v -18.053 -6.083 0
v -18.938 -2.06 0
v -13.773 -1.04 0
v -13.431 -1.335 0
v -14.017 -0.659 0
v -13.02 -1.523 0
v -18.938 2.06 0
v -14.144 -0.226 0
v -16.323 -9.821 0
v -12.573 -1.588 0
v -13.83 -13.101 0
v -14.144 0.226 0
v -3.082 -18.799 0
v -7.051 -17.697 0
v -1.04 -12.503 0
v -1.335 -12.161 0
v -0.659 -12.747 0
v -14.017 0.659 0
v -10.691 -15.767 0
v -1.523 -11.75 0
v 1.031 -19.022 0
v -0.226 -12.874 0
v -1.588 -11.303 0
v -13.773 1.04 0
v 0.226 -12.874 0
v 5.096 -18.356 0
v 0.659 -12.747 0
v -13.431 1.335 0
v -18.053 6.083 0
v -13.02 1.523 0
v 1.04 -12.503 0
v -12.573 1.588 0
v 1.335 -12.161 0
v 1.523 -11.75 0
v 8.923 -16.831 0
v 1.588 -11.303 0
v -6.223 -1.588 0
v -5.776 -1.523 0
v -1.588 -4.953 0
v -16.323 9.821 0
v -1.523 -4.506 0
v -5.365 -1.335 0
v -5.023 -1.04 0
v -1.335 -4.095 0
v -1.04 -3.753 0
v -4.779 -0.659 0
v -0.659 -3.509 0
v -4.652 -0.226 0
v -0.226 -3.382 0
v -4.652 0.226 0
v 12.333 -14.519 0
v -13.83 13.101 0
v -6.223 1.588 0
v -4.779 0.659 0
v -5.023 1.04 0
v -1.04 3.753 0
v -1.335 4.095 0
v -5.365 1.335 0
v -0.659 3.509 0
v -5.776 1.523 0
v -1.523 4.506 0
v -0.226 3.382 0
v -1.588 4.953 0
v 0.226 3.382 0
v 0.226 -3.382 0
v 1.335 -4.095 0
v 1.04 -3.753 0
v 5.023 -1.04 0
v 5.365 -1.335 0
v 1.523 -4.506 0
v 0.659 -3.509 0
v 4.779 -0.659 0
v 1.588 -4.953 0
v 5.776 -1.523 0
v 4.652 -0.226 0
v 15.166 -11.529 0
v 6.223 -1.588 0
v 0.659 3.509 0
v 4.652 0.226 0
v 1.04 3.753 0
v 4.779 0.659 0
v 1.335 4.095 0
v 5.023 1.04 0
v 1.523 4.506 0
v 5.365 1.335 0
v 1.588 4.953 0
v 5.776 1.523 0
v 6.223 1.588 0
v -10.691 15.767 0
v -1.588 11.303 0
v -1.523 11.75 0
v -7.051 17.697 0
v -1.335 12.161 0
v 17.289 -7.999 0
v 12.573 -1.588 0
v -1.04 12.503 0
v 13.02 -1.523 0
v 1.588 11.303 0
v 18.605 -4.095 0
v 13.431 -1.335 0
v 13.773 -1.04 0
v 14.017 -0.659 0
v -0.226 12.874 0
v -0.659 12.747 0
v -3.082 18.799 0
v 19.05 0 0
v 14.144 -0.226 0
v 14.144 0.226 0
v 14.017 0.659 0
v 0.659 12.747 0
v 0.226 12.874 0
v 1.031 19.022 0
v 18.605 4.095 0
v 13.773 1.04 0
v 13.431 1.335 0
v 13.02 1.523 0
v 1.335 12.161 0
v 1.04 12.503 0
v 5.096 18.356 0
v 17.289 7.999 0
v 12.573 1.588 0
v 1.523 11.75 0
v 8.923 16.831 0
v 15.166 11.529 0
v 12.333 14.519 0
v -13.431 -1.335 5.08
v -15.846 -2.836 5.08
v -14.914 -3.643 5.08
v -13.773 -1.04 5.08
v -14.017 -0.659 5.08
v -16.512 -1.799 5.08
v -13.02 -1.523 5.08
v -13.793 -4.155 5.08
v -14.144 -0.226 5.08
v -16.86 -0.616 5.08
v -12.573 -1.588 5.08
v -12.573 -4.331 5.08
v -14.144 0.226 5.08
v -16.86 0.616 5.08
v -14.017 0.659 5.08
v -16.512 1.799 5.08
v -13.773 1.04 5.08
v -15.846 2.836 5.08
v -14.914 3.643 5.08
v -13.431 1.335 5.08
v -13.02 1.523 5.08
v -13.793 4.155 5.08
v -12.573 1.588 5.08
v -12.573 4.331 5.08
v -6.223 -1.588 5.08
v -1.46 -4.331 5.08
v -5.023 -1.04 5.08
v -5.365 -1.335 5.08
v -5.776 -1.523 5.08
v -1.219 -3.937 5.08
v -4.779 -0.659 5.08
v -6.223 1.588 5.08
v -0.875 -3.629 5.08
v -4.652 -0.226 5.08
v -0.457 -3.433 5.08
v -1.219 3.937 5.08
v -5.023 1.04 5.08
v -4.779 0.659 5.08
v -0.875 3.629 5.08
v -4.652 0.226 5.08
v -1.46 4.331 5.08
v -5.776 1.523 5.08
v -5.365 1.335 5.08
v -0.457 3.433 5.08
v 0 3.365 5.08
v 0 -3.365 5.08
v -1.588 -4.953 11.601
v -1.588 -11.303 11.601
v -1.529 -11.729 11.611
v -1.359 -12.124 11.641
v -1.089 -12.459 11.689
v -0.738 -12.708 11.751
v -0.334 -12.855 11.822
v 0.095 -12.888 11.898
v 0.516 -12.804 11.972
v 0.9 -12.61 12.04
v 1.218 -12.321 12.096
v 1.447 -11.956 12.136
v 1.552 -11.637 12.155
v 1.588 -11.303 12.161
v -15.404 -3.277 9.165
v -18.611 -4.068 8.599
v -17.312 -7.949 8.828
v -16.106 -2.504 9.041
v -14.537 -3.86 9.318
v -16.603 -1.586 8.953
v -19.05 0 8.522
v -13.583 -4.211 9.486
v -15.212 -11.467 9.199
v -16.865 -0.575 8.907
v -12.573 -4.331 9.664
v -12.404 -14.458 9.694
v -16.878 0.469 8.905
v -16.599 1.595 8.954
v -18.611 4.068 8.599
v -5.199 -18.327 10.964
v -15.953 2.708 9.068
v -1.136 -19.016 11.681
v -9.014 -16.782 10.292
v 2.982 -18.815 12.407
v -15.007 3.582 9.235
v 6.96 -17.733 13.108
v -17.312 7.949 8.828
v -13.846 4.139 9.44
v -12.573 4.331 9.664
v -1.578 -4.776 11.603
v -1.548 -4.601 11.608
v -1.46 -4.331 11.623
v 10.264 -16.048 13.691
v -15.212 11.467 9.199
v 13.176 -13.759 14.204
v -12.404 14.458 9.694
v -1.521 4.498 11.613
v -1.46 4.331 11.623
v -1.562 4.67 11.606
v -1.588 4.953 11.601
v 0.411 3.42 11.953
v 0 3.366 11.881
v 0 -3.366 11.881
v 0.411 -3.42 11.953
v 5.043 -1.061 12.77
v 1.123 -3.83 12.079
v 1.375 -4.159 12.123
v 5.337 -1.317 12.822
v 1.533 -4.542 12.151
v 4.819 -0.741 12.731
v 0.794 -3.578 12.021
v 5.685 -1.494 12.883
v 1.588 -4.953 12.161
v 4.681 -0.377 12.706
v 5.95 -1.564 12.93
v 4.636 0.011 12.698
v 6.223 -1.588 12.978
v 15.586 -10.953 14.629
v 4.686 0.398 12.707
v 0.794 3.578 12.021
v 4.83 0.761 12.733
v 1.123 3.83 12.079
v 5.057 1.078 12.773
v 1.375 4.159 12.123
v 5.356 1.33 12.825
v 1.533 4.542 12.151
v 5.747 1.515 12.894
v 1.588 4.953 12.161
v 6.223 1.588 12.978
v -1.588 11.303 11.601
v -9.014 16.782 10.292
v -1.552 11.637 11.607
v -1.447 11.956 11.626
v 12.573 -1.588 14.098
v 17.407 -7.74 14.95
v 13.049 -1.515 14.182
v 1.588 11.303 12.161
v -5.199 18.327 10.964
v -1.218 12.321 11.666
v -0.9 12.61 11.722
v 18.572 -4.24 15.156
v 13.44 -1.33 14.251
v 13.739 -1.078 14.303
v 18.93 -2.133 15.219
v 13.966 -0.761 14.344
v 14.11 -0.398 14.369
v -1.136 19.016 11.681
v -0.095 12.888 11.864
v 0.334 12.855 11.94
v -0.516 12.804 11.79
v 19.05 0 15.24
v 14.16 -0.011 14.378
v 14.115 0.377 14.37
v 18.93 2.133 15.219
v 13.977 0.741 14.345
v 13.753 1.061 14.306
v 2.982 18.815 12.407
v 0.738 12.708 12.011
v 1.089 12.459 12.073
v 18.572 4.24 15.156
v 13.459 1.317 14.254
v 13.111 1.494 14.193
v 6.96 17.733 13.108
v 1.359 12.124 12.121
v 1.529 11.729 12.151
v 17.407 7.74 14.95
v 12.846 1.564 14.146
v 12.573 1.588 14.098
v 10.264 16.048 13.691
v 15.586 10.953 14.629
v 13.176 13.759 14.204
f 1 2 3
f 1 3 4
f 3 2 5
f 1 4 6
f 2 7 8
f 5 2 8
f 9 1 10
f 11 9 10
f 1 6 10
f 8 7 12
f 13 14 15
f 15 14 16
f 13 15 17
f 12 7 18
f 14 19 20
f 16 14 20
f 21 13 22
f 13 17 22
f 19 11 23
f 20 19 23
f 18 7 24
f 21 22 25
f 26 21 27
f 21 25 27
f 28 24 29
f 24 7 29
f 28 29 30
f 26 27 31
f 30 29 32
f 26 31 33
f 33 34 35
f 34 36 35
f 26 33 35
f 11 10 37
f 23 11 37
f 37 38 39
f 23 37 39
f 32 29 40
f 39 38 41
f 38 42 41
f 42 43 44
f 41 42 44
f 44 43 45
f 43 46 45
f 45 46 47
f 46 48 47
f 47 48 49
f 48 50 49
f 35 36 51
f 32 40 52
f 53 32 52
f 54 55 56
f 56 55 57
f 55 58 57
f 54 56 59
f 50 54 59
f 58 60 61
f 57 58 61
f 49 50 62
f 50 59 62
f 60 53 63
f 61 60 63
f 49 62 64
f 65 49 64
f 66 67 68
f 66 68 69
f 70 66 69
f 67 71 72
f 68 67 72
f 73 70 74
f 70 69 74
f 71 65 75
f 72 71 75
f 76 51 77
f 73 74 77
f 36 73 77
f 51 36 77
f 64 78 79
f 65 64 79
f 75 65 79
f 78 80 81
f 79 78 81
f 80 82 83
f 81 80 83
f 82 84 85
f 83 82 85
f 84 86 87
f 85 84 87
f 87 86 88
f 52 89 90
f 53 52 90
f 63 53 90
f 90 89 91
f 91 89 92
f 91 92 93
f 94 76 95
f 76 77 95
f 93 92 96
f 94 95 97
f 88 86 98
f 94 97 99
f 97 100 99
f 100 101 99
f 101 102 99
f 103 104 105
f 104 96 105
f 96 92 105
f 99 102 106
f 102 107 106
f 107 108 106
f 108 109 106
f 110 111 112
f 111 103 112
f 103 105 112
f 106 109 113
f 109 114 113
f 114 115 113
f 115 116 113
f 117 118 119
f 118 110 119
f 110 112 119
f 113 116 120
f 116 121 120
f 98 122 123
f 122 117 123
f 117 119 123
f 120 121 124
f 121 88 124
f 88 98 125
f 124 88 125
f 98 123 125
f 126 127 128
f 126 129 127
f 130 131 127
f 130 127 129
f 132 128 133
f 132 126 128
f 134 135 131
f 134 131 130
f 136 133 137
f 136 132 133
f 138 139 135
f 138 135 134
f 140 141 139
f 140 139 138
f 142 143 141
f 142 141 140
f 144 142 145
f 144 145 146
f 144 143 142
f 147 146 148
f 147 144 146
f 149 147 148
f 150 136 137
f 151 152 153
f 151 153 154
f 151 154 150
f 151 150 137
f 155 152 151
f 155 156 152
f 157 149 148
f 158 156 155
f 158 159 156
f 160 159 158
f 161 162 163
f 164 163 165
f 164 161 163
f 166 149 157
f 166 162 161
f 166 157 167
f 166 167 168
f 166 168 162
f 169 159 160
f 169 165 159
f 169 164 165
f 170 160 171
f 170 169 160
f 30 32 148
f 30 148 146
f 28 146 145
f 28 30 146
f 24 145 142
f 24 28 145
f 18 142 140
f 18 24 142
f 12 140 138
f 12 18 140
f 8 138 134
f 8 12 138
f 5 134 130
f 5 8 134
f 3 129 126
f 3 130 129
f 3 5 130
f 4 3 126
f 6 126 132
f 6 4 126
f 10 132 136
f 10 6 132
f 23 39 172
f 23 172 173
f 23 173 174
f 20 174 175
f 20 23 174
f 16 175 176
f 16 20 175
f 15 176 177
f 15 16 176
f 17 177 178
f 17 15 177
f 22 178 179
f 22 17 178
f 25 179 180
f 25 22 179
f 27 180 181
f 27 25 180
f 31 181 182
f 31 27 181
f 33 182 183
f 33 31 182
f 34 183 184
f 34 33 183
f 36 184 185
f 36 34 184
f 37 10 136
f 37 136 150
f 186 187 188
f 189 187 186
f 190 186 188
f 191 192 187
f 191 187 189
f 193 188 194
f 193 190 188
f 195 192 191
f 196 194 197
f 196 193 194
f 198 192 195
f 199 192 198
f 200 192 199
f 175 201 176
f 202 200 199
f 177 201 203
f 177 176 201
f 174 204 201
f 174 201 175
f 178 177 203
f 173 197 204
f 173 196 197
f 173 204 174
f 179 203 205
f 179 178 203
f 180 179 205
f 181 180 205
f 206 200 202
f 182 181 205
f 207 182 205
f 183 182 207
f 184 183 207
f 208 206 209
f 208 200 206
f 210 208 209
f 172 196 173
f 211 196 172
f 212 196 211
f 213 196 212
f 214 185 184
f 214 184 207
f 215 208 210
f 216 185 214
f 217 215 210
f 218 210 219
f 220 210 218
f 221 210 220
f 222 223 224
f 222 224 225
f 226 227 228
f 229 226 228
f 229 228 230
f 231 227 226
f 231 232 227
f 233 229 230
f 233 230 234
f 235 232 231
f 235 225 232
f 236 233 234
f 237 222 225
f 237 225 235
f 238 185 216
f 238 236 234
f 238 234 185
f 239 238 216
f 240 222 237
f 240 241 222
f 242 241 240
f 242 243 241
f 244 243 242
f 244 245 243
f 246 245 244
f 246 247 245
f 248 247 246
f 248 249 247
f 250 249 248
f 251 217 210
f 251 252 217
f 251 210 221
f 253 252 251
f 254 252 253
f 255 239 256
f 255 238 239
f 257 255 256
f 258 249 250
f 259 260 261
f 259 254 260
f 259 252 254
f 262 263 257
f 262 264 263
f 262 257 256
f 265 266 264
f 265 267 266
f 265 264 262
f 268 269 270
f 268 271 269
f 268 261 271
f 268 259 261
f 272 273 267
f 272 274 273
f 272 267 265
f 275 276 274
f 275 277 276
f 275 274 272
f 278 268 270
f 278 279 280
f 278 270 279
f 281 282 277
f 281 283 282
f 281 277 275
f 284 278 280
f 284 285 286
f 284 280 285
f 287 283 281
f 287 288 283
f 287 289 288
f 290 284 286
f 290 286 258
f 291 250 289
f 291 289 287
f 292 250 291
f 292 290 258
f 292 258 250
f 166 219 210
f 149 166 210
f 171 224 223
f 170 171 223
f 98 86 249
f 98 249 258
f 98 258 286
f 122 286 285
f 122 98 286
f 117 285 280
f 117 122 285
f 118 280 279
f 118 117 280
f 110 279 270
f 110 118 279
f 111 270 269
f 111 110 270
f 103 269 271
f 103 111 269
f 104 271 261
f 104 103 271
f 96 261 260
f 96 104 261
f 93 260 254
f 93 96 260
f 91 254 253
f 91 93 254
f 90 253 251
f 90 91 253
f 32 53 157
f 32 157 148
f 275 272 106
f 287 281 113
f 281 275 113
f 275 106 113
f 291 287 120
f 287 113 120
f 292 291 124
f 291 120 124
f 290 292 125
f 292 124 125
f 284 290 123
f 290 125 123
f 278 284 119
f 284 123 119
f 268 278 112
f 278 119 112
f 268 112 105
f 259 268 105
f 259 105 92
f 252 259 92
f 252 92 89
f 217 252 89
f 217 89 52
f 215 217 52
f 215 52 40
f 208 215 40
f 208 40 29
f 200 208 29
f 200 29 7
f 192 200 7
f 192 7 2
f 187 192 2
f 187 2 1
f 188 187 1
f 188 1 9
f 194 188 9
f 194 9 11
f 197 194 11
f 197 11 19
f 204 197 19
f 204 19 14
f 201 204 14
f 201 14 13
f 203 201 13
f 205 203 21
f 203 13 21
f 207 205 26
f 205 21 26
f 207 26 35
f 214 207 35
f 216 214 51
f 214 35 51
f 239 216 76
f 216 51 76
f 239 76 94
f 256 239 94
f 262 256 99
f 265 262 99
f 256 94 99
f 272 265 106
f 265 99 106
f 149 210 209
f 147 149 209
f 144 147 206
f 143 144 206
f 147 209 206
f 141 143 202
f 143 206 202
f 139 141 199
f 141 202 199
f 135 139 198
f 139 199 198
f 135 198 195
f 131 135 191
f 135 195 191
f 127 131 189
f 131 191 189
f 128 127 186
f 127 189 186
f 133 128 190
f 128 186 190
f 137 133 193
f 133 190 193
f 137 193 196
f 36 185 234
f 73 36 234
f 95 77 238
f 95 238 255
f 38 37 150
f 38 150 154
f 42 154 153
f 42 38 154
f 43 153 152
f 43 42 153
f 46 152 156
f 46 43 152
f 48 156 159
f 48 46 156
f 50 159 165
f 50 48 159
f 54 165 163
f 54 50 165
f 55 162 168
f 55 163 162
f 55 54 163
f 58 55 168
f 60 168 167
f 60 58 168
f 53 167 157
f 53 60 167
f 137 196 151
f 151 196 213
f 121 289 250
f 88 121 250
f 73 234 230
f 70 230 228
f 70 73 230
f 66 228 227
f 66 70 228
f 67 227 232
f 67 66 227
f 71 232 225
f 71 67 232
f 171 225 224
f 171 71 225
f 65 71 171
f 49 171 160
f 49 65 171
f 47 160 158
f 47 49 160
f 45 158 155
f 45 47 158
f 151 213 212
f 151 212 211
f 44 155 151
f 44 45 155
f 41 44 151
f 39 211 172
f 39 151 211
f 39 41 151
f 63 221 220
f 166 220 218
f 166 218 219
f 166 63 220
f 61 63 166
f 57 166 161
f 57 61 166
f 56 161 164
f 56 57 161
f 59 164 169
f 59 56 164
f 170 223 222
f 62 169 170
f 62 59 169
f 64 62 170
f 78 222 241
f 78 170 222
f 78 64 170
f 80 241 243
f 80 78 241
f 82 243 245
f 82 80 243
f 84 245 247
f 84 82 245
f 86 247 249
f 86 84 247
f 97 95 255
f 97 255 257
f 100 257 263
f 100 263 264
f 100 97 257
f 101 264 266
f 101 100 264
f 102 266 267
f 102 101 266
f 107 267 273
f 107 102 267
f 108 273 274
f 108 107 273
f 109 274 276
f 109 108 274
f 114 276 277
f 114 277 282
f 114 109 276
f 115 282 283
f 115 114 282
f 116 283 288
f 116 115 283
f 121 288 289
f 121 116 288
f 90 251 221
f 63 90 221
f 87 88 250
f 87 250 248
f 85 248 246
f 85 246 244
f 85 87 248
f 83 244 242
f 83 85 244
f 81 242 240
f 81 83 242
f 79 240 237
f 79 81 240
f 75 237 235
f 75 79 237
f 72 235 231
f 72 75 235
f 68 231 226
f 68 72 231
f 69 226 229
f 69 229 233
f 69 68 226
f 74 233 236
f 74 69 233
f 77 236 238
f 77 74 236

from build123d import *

# Parameters (mm, degrees)
F0_R          = 19.05
F1_DEPTH      = 25.4
F3_DEPTH      = 19.051
F3_DEPTH_BACK = 19.051
F5_DEPTH      = 15.241
F8_DEPTH      = 10.16


with BuildPart() as f1:
    # F0 (on Top) → F1 (new body)
    with BuildSketch(Plane.XY):
        Circle(F0_R)
    extrude(amount=F1_DEPTH)

    # F2 (on Front) → F3 (cut, two sides)
    with BuildSketch(Plane.XZ) as f3_sk:
        Polygon((-19.05, 25.4), (-19.05, 8.521942), (19.05, 15.24), (19.05, 25.4), align=None)
    extrude(amount=F3_DEPTH, mode=Mode.SUBTRACT)
    extrude(f3_sk.sketch, amount=-F3_DEPTH_BACK, mode=Mode.SUBTRACT)

    # F4 (on Top) → F5 (cut, through all)
    with BuildSketch(Plane.XY):
        with BuildLine():
            Line((-1.5875, -4.953), (-1.5875, -11.303))
            ThreePointArc((-1.5875, -11.303), (0, -12.8905), (1.5875, -11.303))
            Line((1.5875, -11.303), (1.5875, -4.953))
            ThreePointArc((1.5875, -4.953), (0, -3.3655), (-1.5875, -4.953))
        make_face()
        with BuildLine():
            Line((-1.5875, 11.303), (-1.5875, 4.953))
            ThreePointArc((-1.5875, 4.953), (0, 3.3655), (1.5875, 4.953))
            Line((1.5875, 4.953), (1.5875, 11.303))
            ThreePointArc((1.5875, 11.303), (0, 12.8905), (-1.5875, 11.303))
        make_face()
        with BuildLine():
            Line((12.573, 1.5875), (6.223, 1.5875))
            ThreePointArc((6.223, 1.5875), (4.6355, 0), (6.223, -1.5875))
            Line((6.223, -1.5875), (12.573, -1.5875))
            ThreePointArc((12.573, -1.5875), (14.1605, 0), (12.573, 1.5875))
        make_face()
        with BuildLine():
            Line((-12.573, -1.5875), (-6.223, -1.5875))
            ThreePointArc((-6.223, -1.5875), (-4.6355, 0), (-6.223, 1.5875))
            Line((-6.223, 1.5875), (-12.573, 1.5875))
            ThreePointArc((-12.573, 1.5875), (-14.1605, 0), (-12.573, -1.5875))
        make_face()
    extrude(amount=F5_DEPTH, mode=Mode.SUBTRACT)

    # F7 (on offset) → F8 (cut)
    with BuildSketch(Plane.XY.offset(15.24)):
        with BuildLine():
            ThreePointArc((-12.573, 4.3307), (-16.9037, 0), (-12.573, -4.3307))
            Line((-12.573, -4.3307), (-6.223, -4.3307))
            Line((-6.223, -4.3307), (0, -4.3307))
            Line((0, -4.3307), (0, 4.3307))
            Line((0, 4.3307), (-6.223, 4.3307))
            Line((-6.223, 4.3307), (-12.573, 4.3307))
        make_face()
    extrude(amount=-F8_DEPTH, mode=Mode.SUBTRACT)


solid = f1.part
